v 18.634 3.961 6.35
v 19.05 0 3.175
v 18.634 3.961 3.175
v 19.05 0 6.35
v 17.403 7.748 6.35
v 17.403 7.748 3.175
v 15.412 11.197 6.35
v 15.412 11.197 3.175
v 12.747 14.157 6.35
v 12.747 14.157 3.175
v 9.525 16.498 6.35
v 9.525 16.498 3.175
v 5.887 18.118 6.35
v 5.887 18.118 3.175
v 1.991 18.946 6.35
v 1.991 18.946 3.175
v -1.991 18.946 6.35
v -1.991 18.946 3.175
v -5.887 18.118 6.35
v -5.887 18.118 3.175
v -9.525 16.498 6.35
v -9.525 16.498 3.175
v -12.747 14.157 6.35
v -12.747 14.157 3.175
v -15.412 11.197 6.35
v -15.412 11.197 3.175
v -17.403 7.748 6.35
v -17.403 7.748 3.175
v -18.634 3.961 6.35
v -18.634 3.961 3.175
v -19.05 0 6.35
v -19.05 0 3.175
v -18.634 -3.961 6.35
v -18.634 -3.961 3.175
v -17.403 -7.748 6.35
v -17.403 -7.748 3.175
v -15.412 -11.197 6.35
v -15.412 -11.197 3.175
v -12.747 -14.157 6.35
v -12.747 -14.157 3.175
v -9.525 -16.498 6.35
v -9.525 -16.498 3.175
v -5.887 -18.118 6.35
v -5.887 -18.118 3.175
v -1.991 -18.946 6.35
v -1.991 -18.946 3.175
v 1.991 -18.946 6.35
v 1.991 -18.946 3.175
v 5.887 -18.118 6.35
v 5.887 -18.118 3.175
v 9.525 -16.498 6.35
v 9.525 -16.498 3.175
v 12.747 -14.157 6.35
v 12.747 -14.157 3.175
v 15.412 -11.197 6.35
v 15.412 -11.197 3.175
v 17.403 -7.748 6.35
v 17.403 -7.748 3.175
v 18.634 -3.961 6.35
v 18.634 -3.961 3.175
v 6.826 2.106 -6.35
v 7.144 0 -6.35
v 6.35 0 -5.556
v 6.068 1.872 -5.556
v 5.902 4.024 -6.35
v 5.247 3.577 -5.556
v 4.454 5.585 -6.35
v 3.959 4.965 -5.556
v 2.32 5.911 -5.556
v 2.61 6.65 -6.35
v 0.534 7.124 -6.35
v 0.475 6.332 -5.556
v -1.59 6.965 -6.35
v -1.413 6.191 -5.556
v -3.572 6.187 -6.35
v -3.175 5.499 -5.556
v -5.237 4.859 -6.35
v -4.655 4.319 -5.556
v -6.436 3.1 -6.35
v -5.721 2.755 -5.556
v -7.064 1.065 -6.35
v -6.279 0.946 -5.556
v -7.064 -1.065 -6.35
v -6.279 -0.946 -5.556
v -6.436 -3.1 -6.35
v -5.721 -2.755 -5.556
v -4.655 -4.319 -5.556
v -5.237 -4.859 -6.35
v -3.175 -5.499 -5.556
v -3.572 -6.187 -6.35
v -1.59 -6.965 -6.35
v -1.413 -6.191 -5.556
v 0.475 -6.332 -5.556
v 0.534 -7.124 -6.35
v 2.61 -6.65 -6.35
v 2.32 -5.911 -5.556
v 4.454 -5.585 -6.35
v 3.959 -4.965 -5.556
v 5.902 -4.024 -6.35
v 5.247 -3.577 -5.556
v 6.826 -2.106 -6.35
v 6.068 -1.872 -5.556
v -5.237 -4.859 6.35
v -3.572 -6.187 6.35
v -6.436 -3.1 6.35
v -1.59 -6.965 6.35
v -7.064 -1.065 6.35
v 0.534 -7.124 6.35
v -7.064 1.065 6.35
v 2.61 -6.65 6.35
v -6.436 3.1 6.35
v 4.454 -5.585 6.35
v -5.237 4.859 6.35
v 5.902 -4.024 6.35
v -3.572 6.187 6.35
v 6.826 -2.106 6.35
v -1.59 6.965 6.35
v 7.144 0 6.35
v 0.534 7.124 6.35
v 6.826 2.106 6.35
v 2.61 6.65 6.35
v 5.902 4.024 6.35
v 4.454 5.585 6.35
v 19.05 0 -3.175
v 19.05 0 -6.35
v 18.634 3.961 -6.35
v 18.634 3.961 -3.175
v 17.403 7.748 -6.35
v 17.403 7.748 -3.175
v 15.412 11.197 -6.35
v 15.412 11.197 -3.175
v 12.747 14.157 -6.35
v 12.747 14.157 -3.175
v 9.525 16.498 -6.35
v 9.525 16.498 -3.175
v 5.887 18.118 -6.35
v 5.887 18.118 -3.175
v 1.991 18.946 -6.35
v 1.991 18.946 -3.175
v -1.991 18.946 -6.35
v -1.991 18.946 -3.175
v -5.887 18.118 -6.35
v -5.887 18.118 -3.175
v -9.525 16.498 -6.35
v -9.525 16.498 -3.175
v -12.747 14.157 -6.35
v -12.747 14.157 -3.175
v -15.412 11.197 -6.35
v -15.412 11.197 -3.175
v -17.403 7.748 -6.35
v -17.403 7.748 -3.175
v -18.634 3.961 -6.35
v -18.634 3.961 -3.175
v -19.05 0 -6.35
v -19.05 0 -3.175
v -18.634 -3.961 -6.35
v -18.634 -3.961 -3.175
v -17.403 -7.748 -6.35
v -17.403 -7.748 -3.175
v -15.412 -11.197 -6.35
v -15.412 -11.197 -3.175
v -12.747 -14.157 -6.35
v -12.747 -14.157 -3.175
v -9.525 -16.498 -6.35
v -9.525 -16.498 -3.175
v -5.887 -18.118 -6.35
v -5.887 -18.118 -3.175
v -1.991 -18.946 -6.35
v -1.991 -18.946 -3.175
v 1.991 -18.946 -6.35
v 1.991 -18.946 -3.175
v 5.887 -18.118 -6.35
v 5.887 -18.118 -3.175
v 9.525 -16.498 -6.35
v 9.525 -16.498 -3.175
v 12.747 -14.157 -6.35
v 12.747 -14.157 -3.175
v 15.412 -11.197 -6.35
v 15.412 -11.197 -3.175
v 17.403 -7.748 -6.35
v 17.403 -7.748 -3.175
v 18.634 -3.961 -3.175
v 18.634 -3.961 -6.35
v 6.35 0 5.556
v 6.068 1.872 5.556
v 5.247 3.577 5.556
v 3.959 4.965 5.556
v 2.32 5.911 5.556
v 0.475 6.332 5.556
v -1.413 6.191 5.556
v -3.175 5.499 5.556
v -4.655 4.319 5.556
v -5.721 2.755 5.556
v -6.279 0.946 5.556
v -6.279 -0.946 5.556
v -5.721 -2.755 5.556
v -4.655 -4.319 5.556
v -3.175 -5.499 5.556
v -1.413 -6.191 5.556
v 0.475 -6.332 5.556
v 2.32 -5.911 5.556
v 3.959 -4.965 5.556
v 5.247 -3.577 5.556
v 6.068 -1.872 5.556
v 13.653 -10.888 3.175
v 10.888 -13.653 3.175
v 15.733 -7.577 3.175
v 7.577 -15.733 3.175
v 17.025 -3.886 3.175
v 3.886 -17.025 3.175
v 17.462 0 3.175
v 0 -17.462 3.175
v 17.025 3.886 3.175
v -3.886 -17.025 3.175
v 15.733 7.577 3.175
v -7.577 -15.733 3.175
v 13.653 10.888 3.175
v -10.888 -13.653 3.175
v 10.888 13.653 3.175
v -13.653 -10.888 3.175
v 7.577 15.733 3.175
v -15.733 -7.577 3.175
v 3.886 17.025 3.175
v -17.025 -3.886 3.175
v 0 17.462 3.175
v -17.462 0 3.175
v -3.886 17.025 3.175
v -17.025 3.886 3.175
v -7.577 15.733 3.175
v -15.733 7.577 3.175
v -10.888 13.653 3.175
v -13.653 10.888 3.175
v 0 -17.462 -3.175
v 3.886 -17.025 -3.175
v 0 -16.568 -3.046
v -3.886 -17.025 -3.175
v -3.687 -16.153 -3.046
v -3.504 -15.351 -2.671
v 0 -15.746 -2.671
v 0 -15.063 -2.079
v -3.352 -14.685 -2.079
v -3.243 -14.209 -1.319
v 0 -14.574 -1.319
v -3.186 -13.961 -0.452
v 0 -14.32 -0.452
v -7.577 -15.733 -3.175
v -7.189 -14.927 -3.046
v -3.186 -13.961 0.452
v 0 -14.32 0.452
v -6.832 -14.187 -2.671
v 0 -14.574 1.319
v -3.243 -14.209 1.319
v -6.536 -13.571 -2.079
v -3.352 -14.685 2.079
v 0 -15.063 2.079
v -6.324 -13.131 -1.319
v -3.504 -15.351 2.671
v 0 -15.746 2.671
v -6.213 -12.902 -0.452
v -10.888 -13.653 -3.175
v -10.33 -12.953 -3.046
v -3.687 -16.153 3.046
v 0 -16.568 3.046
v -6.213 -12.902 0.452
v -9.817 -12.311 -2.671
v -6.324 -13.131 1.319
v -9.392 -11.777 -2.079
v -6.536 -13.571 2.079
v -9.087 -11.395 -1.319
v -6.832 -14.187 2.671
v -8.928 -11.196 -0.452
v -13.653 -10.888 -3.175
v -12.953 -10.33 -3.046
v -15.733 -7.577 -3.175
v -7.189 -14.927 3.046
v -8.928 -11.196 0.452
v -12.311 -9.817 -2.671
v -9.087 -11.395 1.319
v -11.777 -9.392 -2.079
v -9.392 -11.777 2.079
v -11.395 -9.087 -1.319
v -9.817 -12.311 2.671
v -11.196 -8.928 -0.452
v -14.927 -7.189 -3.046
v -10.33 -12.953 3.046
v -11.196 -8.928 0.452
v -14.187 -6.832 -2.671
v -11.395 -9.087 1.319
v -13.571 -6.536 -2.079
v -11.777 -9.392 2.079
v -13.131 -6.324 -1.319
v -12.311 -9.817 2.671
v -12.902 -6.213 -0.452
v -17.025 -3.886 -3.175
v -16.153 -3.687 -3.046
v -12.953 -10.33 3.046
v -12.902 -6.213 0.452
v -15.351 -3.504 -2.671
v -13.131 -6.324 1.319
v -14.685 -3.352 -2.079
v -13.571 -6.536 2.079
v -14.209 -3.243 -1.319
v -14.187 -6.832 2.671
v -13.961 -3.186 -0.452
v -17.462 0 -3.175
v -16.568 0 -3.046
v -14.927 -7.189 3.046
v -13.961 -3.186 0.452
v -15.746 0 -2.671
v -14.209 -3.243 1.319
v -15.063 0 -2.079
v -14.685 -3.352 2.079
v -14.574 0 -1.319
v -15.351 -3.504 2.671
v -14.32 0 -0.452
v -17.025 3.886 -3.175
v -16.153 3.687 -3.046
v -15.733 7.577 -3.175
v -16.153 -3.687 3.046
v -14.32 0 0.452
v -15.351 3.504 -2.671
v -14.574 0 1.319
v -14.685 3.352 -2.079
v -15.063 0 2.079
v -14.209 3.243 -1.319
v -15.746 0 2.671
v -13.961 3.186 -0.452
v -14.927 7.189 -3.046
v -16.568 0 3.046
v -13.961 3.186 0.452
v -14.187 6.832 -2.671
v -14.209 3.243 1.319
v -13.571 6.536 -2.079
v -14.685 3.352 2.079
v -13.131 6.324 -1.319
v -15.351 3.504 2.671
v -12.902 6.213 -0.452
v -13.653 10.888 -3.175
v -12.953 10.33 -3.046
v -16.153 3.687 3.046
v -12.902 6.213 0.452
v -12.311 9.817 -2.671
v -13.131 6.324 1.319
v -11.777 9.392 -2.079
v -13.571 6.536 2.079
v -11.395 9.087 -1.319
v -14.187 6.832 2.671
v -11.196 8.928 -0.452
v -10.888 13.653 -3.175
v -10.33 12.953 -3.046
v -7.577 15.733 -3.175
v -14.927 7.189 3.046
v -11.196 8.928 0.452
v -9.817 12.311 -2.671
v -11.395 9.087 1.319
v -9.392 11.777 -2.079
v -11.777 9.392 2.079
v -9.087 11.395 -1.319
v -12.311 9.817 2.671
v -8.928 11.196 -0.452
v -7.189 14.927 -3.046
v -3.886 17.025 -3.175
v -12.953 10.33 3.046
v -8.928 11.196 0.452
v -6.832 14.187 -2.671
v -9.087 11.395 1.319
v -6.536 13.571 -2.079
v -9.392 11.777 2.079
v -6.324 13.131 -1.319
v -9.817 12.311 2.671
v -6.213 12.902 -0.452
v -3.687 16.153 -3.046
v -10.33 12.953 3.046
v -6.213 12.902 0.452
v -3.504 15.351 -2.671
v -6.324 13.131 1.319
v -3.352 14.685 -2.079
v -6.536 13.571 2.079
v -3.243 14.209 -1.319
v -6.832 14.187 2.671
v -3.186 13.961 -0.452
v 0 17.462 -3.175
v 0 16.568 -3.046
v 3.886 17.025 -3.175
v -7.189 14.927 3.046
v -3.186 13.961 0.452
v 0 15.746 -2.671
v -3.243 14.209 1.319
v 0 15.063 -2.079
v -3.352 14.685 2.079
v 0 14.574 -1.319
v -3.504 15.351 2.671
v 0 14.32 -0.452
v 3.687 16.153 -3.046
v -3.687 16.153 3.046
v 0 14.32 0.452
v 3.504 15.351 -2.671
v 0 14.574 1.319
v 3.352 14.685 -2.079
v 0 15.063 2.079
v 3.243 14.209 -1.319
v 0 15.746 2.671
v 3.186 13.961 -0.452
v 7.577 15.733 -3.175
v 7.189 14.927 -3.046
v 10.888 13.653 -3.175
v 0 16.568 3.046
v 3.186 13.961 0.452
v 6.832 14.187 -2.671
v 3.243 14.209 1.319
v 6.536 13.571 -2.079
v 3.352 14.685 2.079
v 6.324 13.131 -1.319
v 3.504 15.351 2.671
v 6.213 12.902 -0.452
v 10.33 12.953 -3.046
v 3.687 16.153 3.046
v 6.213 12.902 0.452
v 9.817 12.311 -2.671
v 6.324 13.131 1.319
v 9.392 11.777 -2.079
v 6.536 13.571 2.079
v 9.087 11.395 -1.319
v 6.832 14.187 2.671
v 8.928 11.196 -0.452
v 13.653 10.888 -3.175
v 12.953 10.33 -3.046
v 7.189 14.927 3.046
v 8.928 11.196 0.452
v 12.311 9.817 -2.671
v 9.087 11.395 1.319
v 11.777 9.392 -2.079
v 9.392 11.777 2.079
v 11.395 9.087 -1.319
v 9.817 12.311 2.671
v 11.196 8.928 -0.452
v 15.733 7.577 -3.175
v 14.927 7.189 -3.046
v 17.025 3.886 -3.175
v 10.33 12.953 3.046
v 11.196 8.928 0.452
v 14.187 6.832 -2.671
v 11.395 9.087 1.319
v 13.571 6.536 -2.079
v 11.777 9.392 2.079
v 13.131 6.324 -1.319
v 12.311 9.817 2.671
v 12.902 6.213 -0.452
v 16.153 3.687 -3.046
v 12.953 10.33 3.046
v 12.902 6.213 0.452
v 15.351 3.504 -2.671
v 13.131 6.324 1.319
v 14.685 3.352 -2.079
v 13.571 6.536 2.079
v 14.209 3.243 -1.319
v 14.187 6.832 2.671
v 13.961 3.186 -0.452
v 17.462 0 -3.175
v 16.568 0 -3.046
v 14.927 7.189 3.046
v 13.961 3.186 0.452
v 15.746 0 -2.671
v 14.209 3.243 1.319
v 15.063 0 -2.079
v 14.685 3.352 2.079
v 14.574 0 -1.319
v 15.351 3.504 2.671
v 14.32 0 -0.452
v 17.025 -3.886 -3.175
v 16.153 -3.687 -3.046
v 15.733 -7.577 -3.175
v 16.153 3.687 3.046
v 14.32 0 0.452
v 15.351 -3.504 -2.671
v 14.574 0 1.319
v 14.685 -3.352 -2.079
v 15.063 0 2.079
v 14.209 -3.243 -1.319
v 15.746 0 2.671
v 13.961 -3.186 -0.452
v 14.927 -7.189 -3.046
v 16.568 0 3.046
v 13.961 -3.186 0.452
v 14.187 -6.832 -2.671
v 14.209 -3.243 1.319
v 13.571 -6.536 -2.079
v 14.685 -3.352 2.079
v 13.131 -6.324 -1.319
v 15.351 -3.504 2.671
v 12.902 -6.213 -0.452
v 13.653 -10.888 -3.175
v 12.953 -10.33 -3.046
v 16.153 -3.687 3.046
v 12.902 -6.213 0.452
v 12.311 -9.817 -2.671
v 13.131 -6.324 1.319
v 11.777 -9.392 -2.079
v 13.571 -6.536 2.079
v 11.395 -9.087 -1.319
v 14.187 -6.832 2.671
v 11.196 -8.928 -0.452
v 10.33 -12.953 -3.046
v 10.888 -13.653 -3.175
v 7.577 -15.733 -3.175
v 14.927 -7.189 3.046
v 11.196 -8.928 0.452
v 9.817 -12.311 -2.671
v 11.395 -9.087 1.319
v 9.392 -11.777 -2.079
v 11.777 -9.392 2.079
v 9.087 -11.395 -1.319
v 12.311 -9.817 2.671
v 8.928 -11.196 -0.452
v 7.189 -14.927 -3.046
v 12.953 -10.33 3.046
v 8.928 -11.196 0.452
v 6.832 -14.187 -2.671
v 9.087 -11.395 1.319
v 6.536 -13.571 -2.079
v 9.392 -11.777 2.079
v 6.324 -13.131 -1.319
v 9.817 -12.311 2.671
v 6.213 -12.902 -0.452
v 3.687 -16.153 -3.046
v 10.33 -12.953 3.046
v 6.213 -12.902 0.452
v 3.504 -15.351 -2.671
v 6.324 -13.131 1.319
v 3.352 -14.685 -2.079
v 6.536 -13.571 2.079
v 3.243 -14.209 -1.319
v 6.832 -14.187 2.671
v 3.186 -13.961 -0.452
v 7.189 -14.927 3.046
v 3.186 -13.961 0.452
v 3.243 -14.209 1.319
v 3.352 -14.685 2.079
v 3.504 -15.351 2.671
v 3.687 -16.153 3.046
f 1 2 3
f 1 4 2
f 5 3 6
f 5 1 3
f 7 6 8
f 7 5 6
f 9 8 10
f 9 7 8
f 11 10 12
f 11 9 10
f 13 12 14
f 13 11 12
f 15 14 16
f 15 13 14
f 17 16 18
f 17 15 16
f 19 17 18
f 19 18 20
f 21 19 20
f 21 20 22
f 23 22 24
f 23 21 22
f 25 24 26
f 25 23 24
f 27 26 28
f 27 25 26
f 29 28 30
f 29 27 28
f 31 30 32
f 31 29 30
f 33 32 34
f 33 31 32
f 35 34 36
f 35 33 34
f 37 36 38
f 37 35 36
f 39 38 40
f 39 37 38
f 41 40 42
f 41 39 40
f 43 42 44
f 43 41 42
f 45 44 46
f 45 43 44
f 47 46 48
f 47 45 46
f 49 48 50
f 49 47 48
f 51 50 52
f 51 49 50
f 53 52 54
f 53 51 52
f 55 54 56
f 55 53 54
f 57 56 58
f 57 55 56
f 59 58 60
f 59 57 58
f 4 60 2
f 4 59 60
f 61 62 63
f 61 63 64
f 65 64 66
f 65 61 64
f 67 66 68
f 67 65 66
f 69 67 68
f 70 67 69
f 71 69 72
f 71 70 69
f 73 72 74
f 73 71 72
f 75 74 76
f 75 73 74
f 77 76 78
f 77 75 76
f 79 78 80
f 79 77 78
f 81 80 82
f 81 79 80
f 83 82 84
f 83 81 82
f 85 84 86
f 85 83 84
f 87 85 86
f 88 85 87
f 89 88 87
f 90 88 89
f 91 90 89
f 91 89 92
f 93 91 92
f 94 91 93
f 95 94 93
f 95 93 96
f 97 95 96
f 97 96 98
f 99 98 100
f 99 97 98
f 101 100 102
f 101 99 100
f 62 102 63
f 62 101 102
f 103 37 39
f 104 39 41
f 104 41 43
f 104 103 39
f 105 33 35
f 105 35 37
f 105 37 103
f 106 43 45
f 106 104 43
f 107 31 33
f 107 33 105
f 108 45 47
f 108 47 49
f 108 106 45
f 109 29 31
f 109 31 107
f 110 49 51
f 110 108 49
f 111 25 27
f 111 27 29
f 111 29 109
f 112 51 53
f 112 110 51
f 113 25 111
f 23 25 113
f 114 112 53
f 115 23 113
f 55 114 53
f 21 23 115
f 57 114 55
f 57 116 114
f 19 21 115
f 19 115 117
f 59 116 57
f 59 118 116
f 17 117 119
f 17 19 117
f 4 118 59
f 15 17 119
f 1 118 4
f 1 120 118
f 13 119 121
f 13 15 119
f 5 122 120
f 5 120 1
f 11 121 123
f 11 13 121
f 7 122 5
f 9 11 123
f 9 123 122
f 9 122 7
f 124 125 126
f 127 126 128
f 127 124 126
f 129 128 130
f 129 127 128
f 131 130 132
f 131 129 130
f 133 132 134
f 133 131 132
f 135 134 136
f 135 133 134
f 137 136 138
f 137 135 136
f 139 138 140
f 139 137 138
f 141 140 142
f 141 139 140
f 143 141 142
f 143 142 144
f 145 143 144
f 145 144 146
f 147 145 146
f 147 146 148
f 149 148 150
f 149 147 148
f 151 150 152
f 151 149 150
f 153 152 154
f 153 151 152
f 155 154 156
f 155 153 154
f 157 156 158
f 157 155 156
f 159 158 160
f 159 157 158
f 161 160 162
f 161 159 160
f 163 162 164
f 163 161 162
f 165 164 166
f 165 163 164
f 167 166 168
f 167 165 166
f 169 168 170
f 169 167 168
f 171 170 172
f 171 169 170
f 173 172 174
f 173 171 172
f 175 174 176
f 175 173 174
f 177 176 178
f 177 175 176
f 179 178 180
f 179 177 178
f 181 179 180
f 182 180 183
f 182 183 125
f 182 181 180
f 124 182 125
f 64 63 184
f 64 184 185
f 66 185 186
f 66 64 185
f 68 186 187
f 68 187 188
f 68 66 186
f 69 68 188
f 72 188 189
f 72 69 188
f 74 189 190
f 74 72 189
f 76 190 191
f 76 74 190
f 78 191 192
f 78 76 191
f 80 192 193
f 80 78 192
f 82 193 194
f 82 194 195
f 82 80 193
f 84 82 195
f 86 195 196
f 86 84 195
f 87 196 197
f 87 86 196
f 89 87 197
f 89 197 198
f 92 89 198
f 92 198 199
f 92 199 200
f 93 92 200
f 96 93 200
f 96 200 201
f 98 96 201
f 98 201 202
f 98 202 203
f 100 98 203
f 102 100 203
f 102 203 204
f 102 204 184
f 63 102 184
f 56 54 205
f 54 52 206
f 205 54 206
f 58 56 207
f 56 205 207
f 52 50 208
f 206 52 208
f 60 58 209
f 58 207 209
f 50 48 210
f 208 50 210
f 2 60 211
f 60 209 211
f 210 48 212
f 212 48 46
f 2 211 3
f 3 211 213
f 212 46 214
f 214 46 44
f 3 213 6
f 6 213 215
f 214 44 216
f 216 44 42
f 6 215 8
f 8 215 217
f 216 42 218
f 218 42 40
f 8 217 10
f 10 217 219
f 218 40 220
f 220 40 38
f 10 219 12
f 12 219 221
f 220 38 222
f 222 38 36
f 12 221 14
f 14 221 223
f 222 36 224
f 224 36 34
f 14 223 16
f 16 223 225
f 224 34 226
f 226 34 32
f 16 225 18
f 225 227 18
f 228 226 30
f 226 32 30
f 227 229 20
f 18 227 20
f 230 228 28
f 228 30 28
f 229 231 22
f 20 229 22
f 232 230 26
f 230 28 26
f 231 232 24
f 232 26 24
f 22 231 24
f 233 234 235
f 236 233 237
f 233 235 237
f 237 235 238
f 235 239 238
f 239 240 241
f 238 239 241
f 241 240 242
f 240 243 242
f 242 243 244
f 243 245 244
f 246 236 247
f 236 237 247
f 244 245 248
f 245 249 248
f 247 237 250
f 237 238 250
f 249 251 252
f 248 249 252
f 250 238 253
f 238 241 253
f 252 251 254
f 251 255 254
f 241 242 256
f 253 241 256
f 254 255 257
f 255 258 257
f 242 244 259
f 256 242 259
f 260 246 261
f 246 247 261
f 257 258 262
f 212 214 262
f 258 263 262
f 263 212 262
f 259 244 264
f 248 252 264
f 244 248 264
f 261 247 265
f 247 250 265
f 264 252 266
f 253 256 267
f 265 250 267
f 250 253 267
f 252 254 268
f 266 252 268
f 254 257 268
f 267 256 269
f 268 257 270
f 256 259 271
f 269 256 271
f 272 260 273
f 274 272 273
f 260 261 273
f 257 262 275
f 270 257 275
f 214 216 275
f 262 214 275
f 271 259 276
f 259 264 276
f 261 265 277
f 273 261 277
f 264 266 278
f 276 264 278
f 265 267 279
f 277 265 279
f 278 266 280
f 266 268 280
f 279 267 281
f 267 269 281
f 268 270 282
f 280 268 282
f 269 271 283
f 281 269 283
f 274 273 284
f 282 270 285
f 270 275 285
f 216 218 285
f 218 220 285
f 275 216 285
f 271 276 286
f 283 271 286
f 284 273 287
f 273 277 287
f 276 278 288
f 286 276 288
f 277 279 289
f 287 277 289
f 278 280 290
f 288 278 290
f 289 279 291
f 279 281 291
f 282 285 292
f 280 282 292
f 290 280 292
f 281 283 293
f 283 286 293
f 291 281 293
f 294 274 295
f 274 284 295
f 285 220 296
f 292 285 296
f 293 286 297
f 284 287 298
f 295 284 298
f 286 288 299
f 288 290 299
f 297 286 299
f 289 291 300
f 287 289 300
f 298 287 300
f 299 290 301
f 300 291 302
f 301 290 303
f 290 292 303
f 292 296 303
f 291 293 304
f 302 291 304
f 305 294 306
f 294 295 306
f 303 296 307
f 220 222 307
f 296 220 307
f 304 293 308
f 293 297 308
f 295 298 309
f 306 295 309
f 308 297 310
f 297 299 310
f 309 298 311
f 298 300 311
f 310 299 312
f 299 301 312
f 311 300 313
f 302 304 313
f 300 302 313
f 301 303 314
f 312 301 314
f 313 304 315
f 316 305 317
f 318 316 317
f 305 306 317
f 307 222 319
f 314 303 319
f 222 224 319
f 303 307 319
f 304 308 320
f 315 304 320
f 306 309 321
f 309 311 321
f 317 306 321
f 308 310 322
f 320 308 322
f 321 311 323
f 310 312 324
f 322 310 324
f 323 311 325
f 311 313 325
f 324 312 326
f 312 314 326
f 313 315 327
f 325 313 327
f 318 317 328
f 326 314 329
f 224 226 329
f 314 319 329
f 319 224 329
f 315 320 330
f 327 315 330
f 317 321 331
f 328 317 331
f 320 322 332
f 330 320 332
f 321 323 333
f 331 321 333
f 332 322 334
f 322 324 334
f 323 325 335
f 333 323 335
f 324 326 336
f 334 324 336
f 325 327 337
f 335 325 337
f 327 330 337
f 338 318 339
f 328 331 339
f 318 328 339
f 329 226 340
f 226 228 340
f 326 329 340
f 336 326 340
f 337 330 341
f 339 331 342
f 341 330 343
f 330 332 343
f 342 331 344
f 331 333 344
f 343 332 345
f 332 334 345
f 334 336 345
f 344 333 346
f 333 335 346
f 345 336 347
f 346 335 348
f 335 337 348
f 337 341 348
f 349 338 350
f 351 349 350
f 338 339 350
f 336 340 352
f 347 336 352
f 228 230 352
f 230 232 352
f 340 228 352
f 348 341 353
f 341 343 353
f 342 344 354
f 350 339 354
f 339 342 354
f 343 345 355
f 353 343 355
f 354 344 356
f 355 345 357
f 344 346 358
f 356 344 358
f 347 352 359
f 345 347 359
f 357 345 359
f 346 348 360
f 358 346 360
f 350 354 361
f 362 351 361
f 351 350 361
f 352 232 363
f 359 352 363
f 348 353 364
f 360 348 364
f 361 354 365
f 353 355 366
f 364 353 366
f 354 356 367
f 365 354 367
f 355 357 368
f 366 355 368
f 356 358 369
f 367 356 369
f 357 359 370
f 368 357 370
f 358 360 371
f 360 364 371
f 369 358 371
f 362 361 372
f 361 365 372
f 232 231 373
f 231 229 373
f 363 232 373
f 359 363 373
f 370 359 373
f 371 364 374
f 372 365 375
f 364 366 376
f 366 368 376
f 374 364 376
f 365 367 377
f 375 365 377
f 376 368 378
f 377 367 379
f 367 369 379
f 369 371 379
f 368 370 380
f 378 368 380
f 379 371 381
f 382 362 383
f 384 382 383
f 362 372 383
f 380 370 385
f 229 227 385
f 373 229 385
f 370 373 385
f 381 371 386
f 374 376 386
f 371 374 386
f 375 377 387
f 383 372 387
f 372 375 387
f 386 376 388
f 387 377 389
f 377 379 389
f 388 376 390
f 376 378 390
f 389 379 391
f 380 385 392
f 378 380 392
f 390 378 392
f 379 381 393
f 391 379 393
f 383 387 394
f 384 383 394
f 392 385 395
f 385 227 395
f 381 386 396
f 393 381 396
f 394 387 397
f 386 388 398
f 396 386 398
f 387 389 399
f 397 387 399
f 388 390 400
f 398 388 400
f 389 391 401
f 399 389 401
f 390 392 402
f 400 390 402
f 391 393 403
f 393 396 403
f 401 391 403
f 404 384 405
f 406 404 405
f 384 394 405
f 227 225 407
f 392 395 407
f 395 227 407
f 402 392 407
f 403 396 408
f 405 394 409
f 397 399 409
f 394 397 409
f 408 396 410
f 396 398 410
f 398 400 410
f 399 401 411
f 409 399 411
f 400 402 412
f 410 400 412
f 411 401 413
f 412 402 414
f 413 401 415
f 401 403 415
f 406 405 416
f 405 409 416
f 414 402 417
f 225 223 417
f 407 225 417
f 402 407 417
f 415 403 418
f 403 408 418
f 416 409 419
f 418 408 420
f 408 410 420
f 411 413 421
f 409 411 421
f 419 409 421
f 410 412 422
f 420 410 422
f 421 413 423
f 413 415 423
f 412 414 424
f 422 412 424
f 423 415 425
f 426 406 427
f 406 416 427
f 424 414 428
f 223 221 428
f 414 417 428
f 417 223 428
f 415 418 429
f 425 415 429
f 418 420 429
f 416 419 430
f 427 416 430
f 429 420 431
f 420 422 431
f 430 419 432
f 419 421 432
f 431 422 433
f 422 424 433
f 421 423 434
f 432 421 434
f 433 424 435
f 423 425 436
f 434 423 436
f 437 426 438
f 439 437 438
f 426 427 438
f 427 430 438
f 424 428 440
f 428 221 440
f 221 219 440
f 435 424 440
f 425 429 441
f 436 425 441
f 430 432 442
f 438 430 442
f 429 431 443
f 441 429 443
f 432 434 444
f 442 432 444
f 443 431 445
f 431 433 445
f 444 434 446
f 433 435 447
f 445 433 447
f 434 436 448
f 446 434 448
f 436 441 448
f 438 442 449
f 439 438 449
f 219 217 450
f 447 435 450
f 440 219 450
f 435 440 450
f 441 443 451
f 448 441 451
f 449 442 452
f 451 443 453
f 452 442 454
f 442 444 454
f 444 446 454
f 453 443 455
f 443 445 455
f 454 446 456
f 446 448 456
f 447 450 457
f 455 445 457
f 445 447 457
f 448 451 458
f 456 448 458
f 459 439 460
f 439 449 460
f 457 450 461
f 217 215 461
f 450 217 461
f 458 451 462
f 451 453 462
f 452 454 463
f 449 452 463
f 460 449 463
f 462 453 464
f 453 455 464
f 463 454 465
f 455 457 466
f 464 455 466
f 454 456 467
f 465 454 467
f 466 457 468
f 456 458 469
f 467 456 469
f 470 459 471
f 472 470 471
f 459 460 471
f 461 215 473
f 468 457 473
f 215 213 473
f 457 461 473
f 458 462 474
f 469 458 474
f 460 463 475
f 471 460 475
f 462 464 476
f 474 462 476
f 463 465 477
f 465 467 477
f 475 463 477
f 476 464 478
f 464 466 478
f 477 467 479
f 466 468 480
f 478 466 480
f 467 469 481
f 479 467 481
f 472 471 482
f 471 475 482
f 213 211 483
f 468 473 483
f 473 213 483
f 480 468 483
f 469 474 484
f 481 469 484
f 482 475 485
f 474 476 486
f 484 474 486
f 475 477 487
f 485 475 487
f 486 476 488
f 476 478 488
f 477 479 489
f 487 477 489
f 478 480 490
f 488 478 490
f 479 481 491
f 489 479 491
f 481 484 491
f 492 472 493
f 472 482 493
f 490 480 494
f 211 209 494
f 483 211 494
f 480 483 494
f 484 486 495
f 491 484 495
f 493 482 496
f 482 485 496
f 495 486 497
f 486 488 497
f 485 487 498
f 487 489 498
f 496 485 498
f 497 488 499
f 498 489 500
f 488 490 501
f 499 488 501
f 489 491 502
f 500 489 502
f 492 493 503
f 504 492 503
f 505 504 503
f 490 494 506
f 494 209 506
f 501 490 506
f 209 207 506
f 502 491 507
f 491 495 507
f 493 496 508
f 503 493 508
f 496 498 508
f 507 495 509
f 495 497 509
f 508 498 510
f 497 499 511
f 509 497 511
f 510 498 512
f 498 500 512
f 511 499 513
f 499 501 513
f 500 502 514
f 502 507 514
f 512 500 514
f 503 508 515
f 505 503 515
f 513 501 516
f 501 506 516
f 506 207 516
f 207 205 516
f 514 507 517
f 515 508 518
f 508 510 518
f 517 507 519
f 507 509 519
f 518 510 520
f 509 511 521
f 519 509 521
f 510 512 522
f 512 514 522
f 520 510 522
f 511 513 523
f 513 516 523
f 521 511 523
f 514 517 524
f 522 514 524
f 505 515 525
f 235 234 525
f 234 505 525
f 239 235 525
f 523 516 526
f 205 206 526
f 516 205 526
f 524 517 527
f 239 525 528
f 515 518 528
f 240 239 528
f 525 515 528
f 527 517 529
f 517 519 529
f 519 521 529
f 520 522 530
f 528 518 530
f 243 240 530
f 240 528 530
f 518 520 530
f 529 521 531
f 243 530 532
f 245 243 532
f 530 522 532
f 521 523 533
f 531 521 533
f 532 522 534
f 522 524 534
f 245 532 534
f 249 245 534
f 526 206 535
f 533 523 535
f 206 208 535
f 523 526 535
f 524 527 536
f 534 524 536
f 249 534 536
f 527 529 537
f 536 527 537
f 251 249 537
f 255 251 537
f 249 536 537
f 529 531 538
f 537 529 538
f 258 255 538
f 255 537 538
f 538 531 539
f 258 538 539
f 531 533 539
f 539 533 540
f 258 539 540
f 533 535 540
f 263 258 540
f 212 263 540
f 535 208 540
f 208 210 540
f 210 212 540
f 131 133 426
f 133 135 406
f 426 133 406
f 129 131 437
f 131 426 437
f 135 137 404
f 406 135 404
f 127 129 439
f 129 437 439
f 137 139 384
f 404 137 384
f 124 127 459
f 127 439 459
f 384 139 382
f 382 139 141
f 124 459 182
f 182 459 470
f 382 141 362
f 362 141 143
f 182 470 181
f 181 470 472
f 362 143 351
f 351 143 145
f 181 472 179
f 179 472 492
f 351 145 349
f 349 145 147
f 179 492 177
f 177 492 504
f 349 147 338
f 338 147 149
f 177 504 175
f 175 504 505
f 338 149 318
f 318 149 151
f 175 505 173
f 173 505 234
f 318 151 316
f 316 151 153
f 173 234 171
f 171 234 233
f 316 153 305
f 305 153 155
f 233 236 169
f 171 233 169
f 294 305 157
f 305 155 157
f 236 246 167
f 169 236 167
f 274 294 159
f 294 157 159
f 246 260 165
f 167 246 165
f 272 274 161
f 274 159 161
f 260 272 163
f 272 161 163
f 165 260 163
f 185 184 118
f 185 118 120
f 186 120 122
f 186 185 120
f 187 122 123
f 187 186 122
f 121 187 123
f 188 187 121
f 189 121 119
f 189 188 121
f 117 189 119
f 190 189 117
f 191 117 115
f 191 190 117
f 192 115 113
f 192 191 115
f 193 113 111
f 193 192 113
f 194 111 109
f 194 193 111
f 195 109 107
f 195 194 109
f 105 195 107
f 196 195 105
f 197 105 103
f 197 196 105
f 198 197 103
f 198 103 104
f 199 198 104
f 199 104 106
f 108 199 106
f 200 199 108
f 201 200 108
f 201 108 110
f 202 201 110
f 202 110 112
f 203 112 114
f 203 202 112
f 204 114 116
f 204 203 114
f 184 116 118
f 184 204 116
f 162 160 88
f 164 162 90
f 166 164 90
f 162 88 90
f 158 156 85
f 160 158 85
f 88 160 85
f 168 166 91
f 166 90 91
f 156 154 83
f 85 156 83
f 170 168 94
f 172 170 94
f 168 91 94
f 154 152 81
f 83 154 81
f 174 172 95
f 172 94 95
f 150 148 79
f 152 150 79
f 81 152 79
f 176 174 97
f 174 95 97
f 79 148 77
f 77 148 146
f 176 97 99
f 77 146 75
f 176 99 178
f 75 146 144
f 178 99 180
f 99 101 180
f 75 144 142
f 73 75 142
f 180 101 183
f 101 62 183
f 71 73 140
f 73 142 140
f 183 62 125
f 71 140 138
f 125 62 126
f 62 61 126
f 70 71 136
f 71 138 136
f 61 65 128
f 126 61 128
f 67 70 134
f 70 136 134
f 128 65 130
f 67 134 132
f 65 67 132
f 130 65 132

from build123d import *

# Parameters (mm, degrees)
SKETCH1_R      = 19.05
SKETCH1_R_2    = 6.35
EXTRUDE1_DEPTH = 6.35
CHAMFER1_SIZE  = 0.79375


with BuildPart() as part:
    # Sketch1 → Extrude1 (new, symmetric)
    with BuildSketch(Plane.XY):
        Circle(SKETCH1_R)
        Circle(SKETCH1_R_2, mode=Mode.SUBTRACT)
    extrude(amount=EXTRUDE1_DEPTH, both=True)

    # Chamfer1
    chamfer1_edges = [part.edges().sort_by_distance(p)[0] for p in [
        (-6.35, 0, -6.35),
        (-6.35, 0, 6.35),
    ]]
    chamfer(chamfer1_edges, length=CHAMFER1_SIZE)

    # Sketch2 → Cut-Revolve1 (revolve, cut)
    with BuildSketch(Plane(origin=(0, 0, 0), x_dir=(0, 0, -1), z_dir=(1, 0, 0)), mode=Mode.PRIVATE) as cut_revolve1_sk:
        with BuildLine():
            Line((-3.175, 17.4625), (-3.175, 19.05))
            Line((-3.175, 19.05), (3.175, 19.05))
            Line((3.175, 19.05), (3.175, 17.4625))
            ThreePointArc((3.175, 17.4625), (0, 14.2875), (-3.175, 17.4625))
        make_face()
    revolve(cut_revolve1_sk.sketch.rotate(Axis((0, 0, 6.35), (0, 0, -1)), 180), axis=Axis((0, 0, 6.35), (0, 0, -1)), mode=Mode.SUBTRACT)


solid = part.part
